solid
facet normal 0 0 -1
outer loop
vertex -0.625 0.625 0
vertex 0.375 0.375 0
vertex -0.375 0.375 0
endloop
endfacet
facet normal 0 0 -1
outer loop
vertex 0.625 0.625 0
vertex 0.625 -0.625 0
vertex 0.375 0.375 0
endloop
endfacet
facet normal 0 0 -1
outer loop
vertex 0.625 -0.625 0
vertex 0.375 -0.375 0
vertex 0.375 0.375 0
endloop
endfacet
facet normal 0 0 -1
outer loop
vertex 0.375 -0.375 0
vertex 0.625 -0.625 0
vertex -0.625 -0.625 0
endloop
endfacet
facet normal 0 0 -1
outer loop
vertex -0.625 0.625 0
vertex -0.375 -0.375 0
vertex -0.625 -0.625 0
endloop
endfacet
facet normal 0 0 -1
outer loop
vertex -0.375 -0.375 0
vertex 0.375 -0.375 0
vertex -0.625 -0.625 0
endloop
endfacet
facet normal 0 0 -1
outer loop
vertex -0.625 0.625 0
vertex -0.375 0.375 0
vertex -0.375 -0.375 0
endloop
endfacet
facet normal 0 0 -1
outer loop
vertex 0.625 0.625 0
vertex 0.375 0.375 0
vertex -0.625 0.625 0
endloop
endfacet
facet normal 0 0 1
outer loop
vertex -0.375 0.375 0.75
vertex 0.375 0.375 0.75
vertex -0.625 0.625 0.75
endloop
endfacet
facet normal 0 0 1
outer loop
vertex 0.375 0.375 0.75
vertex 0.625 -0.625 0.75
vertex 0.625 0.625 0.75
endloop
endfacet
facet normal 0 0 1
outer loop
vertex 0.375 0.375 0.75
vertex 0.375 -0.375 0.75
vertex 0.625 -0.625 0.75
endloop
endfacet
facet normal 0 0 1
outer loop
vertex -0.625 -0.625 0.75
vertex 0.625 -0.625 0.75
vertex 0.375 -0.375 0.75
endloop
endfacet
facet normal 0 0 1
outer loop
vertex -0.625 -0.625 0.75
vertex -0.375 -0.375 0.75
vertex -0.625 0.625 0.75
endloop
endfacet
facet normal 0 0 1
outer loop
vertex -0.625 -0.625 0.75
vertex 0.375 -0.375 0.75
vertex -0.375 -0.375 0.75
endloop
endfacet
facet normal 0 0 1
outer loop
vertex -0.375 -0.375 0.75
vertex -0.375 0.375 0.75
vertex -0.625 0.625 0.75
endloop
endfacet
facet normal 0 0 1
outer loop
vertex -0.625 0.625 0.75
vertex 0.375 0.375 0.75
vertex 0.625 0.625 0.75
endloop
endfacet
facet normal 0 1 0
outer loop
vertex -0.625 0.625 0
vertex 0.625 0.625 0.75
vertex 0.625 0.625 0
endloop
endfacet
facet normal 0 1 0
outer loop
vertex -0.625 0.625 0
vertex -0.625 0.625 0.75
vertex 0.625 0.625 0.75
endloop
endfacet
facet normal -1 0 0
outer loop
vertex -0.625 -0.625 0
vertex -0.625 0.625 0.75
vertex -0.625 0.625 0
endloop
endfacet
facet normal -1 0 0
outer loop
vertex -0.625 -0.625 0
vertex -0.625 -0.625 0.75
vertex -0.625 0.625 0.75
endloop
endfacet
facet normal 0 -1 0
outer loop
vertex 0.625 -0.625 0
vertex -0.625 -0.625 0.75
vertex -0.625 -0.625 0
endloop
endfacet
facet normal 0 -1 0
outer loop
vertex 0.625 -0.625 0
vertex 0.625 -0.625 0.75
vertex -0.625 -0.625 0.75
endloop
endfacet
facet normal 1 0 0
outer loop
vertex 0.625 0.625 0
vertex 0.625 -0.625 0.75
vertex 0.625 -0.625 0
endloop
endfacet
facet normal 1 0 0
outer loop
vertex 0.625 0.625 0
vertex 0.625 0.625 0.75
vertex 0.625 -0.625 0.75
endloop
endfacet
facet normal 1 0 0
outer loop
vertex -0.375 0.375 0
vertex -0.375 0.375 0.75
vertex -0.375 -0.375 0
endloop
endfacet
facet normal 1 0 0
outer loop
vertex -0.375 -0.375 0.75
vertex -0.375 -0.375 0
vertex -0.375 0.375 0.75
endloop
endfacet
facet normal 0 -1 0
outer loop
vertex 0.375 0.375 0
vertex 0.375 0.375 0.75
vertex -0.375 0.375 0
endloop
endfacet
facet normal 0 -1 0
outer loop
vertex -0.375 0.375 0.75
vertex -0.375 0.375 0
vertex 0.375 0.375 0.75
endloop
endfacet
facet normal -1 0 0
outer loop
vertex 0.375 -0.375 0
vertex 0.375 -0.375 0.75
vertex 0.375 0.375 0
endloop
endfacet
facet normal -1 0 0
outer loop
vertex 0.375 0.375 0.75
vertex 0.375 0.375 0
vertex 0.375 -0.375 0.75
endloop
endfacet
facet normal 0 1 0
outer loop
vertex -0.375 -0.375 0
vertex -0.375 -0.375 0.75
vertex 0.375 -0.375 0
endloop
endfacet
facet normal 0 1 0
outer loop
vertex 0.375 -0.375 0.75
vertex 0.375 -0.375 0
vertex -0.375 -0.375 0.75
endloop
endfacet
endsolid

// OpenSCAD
EPS = 0.01;

translate([-0.625, -0.625, 0.0])
rotate([0, 0, 0])
linear_extrude(height=0.75)
difference() {
    polygon(points=[[1.25, 0.0], [1.25, 1.25], [0.0, 1.25], [0.0, 0.0]]);
    translate([0, 0, EPS])
    polygon(points=[[1.0, 0.25], [1.0, 1.0], [0.25, 1.0], [0.25, 0.25]]);
}
